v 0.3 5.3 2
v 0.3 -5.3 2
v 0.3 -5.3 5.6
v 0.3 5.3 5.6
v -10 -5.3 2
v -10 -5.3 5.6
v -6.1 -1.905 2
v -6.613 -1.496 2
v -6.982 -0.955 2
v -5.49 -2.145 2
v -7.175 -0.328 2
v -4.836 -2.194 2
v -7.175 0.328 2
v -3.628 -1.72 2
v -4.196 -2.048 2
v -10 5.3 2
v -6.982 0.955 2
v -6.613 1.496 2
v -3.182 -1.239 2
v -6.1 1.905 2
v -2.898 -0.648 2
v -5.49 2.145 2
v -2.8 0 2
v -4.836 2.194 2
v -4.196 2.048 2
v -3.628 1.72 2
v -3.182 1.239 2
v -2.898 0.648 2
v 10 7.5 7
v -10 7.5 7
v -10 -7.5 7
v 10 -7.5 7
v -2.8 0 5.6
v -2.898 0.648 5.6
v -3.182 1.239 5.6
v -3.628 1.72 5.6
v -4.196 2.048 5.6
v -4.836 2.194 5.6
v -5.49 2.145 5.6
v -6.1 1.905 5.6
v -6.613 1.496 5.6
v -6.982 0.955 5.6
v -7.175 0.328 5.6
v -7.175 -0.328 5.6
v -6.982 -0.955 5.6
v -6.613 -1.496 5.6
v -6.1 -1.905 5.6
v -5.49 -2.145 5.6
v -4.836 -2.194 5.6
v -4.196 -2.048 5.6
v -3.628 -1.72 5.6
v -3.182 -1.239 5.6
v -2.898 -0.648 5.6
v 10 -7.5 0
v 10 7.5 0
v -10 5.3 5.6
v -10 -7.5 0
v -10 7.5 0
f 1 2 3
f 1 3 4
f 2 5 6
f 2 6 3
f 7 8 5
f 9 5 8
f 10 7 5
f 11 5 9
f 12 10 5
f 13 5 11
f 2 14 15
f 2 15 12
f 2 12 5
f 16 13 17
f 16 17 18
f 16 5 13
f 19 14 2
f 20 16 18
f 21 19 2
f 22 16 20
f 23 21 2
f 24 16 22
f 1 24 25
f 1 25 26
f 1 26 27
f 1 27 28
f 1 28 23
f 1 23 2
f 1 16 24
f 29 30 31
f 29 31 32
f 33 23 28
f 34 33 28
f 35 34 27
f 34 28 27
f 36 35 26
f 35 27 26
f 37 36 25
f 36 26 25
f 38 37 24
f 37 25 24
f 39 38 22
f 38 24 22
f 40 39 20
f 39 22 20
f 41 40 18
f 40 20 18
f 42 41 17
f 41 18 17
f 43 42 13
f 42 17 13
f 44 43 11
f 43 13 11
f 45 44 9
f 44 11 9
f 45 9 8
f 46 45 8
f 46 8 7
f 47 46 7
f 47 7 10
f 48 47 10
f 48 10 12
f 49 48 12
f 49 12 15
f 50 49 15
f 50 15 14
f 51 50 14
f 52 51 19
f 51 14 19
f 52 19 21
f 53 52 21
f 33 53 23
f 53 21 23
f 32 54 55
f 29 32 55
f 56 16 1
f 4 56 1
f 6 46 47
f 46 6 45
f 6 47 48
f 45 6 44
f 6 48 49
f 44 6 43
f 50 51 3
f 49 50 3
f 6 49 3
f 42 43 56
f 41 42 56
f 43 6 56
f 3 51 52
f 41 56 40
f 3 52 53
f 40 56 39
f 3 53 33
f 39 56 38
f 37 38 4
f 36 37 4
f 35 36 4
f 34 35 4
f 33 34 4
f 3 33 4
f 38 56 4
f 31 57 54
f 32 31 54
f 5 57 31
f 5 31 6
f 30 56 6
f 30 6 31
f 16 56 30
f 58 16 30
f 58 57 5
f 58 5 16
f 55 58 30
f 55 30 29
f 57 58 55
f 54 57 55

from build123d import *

# Parameters (mm, degrees)
F0_W     = 20
F0_H     = 15
F1_DEPTH = 7
F3_W     = 10.6
F3_H     = 10.6
F4_DEPTH = 3.6
F5_R     = 2.2
F6_DEPTH = 7


with BuildPart() as f1:
    # F0 (on Top) → F1 (new body)
    with BuildSketch(Plane.XY):
        Rectangle(F0_W, F0_H)
    extrude(amount=F1_DEPTH)

    # F3 (on offset) → F4 (cut)
    with BuildSketch(Plane.XY.offset(2)):
        with Locations((-5, 0)):
            Rectangle(F3_W, F3_H)
    extrude(amount=F4_DEPTH, mode=Mode.SUBTRACT)

    # F5 (on Top) → F6 (join, through all)
    with BuildSketch(Plane.XY):
        with Locations((-5, 0)):
            Circle(F5_R)
    extrude(amount=F6_DEPTH)


solid = f1.part
